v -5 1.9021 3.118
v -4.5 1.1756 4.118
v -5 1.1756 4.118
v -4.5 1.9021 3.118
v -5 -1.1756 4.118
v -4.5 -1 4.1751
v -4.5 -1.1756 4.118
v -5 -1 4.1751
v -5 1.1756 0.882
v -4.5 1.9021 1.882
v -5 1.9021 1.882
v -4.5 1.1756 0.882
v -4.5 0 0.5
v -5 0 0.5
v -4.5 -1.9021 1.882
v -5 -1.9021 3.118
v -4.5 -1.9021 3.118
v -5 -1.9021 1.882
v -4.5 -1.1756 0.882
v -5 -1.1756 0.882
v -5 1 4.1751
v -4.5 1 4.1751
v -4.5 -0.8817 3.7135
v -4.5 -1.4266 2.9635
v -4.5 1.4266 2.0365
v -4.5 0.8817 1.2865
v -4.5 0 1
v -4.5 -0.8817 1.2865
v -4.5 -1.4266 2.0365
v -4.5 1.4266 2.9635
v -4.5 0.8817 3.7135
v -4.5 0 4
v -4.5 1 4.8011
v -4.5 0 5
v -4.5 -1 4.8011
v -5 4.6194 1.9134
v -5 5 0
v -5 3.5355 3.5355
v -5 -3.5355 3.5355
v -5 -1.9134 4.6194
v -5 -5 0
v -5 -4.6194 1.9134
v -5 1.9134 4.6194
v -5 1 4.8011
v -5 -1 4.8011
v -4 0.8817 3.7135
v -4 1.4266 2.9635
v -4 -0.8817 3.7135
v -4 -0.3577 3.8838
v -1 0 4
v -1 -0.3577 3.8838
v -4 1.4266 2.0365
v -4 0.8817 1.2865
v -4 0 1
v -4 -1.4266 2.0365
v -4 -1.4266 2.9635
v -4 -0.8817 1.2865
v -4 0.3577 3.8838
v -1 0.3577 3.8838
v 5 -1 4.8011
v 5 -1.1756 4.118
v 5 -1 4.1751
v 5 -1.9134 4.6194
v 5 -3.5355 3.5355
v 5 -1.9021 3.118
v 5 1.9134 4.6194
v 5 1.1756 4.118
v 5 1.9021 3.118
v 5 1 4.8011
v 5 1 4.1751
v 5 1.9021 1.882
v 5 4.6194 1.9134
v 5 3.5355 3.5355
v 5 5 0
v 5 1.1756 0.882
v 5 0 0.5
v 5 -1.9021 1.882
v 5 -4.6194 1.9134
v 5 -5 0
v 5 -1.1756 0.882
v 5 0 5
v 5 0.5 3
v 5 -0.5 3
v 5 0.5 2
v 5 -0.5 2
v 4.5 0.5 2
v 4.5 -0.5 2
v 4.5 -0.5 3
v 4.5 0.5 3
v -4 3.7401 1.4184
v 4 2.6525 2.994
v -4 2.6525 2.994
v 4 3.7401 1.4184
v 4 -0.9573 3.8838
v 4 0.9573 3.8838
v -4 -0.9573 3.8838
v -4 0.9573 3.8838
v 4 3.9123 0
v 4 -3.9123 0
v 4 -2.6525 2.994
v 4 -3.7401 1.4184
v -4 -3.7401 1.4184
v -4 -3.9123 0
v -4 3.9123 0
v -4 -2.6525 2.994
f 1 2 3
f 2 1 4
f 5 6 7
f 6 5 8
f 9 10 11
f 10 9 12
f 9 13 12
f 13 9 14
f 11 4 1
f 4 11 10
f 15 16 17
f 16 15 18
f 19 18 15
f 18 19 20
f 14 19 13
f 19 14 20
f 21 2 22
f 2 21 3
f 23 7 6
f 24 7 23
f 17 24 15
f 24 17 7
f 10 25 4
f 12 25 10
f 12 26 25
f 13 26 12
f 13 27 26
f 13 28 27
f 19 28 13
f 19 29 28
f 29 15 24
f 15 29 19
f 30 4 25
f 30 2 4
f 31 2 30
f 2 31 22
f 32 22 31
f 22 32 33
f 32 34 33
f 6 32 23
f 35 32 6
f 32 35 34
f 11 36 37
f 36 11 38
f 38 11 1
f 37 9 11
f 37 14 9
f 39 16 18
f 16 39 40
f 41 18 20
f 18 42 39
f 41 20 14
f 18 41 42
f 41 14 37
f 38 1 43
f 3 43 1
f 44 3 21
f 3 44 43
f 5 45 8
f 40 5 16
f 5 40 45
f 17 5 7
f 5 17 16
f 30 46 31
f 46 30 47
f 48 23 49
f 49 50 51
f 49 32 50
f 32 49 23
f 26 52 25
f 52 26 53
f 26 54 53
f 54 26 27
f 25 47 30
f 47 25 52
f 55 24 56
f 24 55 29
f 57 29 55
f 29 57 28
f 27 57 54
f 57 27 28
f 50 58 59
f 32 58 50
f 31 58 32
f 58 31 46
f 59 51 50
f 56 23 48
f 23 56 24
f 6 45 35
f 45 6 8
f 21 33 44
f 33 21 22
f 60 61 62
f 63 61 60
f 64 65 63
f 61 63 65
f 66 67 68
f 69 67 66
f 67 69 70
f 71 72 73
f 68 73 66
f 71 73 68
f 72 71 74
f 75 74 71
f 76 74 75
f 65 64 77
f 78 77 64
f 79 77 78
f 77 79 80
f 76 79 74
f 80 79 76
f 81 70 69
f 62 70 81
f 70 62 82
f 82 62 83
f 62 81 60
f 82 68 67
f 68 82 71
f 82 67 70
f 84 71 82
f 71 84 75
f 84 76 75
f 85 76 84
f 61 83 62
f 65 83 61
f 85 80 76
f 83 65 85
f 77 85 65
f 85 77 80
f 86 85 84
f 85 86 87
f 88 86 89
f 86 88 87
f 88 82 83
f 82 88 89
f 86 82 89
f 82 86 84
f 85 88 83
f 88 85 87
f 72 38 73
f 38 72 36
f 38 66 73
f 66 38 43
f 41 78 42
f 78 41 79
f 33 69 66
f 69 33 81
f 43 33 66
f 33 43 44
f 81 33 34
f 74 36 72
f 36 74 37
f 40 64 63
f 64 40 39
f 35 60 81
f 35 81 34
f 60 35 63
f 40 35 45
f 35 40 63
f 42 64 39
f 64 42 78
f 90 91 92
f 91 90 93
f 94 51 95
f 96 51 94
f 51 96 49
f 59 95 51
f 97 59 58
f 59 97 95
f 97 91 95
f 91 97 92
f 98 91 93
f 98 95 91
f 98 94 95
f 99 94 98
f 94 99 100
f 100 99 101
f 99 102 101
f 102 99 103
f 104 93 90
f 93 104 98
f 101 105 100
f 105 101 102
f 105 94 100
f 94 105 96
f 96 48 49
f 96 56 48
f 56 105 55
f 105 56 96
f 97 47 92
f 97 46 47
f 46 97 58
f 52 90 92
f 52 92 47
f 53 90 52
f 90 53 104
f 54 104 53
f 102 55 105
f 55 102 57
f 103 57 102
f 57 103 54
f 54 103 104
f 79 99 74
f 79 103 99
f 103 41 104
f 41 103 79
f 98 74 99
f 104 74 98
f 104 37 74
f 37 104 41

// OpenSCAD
/** 
 * LED Holder for backlickt.
 *
 * command: 
 * 
 * 
 * 
 */

module _led( radius=10,length=20,led_holder=2, thickness=2, led=1 ) {
    cylinder(h = thickness/4, r = led_holder, center = false, $fn=10);
    cylinder(h = thickness+2, r = led, center = false, $fn=10);
    cube(size = [10,200], center = true);
    translate([-radius/2-led_holder/2,-1,0])
        cube(size = [radius/2,1,thickness/4], center = false);
    translate([-radius/2-led_holder/2,0,0])
        cube(size = [radius/2,1,thickness/4], center = false);
}

module reflector( radius=10,length=20,led_holder=2, thickness=2, led=1 ) {

    led_holder_height=radius + 1;

    rotate([0,90,0]) {
        difference() {
            union() {
                cylinder(h = length, r = radius, center = true);
            }

            cylinder(h = length-thickness, r = radius-thickness/2, center = true);
            translate([radius/2,0,0])
            cube(size = [radius,radius*2,length], center = true);
            //            rotate([0,270,0]) {
            //                translate([0, 0, (radius-3)])
            //                    cylinder(h = led_holder_height, r = led, center = false);
            //                }


            //holes for the LED
            rotate([0,0,0]) {
                translate([-(radius-led_holder)+0.5, 0, -length/2]) {
                    _led( radius, length, led_holder, thickness, led );
                }
            }
            rotate([0,0,0]) {
                translate([-(radius-led_holder)+0.5, 0, (length/2)]) {
                    _led( radius, length, led_holder, thickness, led );
                }
            }
        }
    }
}

reflector(length=10, radius=5, led=1.5, led_holder=2, thickness=2);
